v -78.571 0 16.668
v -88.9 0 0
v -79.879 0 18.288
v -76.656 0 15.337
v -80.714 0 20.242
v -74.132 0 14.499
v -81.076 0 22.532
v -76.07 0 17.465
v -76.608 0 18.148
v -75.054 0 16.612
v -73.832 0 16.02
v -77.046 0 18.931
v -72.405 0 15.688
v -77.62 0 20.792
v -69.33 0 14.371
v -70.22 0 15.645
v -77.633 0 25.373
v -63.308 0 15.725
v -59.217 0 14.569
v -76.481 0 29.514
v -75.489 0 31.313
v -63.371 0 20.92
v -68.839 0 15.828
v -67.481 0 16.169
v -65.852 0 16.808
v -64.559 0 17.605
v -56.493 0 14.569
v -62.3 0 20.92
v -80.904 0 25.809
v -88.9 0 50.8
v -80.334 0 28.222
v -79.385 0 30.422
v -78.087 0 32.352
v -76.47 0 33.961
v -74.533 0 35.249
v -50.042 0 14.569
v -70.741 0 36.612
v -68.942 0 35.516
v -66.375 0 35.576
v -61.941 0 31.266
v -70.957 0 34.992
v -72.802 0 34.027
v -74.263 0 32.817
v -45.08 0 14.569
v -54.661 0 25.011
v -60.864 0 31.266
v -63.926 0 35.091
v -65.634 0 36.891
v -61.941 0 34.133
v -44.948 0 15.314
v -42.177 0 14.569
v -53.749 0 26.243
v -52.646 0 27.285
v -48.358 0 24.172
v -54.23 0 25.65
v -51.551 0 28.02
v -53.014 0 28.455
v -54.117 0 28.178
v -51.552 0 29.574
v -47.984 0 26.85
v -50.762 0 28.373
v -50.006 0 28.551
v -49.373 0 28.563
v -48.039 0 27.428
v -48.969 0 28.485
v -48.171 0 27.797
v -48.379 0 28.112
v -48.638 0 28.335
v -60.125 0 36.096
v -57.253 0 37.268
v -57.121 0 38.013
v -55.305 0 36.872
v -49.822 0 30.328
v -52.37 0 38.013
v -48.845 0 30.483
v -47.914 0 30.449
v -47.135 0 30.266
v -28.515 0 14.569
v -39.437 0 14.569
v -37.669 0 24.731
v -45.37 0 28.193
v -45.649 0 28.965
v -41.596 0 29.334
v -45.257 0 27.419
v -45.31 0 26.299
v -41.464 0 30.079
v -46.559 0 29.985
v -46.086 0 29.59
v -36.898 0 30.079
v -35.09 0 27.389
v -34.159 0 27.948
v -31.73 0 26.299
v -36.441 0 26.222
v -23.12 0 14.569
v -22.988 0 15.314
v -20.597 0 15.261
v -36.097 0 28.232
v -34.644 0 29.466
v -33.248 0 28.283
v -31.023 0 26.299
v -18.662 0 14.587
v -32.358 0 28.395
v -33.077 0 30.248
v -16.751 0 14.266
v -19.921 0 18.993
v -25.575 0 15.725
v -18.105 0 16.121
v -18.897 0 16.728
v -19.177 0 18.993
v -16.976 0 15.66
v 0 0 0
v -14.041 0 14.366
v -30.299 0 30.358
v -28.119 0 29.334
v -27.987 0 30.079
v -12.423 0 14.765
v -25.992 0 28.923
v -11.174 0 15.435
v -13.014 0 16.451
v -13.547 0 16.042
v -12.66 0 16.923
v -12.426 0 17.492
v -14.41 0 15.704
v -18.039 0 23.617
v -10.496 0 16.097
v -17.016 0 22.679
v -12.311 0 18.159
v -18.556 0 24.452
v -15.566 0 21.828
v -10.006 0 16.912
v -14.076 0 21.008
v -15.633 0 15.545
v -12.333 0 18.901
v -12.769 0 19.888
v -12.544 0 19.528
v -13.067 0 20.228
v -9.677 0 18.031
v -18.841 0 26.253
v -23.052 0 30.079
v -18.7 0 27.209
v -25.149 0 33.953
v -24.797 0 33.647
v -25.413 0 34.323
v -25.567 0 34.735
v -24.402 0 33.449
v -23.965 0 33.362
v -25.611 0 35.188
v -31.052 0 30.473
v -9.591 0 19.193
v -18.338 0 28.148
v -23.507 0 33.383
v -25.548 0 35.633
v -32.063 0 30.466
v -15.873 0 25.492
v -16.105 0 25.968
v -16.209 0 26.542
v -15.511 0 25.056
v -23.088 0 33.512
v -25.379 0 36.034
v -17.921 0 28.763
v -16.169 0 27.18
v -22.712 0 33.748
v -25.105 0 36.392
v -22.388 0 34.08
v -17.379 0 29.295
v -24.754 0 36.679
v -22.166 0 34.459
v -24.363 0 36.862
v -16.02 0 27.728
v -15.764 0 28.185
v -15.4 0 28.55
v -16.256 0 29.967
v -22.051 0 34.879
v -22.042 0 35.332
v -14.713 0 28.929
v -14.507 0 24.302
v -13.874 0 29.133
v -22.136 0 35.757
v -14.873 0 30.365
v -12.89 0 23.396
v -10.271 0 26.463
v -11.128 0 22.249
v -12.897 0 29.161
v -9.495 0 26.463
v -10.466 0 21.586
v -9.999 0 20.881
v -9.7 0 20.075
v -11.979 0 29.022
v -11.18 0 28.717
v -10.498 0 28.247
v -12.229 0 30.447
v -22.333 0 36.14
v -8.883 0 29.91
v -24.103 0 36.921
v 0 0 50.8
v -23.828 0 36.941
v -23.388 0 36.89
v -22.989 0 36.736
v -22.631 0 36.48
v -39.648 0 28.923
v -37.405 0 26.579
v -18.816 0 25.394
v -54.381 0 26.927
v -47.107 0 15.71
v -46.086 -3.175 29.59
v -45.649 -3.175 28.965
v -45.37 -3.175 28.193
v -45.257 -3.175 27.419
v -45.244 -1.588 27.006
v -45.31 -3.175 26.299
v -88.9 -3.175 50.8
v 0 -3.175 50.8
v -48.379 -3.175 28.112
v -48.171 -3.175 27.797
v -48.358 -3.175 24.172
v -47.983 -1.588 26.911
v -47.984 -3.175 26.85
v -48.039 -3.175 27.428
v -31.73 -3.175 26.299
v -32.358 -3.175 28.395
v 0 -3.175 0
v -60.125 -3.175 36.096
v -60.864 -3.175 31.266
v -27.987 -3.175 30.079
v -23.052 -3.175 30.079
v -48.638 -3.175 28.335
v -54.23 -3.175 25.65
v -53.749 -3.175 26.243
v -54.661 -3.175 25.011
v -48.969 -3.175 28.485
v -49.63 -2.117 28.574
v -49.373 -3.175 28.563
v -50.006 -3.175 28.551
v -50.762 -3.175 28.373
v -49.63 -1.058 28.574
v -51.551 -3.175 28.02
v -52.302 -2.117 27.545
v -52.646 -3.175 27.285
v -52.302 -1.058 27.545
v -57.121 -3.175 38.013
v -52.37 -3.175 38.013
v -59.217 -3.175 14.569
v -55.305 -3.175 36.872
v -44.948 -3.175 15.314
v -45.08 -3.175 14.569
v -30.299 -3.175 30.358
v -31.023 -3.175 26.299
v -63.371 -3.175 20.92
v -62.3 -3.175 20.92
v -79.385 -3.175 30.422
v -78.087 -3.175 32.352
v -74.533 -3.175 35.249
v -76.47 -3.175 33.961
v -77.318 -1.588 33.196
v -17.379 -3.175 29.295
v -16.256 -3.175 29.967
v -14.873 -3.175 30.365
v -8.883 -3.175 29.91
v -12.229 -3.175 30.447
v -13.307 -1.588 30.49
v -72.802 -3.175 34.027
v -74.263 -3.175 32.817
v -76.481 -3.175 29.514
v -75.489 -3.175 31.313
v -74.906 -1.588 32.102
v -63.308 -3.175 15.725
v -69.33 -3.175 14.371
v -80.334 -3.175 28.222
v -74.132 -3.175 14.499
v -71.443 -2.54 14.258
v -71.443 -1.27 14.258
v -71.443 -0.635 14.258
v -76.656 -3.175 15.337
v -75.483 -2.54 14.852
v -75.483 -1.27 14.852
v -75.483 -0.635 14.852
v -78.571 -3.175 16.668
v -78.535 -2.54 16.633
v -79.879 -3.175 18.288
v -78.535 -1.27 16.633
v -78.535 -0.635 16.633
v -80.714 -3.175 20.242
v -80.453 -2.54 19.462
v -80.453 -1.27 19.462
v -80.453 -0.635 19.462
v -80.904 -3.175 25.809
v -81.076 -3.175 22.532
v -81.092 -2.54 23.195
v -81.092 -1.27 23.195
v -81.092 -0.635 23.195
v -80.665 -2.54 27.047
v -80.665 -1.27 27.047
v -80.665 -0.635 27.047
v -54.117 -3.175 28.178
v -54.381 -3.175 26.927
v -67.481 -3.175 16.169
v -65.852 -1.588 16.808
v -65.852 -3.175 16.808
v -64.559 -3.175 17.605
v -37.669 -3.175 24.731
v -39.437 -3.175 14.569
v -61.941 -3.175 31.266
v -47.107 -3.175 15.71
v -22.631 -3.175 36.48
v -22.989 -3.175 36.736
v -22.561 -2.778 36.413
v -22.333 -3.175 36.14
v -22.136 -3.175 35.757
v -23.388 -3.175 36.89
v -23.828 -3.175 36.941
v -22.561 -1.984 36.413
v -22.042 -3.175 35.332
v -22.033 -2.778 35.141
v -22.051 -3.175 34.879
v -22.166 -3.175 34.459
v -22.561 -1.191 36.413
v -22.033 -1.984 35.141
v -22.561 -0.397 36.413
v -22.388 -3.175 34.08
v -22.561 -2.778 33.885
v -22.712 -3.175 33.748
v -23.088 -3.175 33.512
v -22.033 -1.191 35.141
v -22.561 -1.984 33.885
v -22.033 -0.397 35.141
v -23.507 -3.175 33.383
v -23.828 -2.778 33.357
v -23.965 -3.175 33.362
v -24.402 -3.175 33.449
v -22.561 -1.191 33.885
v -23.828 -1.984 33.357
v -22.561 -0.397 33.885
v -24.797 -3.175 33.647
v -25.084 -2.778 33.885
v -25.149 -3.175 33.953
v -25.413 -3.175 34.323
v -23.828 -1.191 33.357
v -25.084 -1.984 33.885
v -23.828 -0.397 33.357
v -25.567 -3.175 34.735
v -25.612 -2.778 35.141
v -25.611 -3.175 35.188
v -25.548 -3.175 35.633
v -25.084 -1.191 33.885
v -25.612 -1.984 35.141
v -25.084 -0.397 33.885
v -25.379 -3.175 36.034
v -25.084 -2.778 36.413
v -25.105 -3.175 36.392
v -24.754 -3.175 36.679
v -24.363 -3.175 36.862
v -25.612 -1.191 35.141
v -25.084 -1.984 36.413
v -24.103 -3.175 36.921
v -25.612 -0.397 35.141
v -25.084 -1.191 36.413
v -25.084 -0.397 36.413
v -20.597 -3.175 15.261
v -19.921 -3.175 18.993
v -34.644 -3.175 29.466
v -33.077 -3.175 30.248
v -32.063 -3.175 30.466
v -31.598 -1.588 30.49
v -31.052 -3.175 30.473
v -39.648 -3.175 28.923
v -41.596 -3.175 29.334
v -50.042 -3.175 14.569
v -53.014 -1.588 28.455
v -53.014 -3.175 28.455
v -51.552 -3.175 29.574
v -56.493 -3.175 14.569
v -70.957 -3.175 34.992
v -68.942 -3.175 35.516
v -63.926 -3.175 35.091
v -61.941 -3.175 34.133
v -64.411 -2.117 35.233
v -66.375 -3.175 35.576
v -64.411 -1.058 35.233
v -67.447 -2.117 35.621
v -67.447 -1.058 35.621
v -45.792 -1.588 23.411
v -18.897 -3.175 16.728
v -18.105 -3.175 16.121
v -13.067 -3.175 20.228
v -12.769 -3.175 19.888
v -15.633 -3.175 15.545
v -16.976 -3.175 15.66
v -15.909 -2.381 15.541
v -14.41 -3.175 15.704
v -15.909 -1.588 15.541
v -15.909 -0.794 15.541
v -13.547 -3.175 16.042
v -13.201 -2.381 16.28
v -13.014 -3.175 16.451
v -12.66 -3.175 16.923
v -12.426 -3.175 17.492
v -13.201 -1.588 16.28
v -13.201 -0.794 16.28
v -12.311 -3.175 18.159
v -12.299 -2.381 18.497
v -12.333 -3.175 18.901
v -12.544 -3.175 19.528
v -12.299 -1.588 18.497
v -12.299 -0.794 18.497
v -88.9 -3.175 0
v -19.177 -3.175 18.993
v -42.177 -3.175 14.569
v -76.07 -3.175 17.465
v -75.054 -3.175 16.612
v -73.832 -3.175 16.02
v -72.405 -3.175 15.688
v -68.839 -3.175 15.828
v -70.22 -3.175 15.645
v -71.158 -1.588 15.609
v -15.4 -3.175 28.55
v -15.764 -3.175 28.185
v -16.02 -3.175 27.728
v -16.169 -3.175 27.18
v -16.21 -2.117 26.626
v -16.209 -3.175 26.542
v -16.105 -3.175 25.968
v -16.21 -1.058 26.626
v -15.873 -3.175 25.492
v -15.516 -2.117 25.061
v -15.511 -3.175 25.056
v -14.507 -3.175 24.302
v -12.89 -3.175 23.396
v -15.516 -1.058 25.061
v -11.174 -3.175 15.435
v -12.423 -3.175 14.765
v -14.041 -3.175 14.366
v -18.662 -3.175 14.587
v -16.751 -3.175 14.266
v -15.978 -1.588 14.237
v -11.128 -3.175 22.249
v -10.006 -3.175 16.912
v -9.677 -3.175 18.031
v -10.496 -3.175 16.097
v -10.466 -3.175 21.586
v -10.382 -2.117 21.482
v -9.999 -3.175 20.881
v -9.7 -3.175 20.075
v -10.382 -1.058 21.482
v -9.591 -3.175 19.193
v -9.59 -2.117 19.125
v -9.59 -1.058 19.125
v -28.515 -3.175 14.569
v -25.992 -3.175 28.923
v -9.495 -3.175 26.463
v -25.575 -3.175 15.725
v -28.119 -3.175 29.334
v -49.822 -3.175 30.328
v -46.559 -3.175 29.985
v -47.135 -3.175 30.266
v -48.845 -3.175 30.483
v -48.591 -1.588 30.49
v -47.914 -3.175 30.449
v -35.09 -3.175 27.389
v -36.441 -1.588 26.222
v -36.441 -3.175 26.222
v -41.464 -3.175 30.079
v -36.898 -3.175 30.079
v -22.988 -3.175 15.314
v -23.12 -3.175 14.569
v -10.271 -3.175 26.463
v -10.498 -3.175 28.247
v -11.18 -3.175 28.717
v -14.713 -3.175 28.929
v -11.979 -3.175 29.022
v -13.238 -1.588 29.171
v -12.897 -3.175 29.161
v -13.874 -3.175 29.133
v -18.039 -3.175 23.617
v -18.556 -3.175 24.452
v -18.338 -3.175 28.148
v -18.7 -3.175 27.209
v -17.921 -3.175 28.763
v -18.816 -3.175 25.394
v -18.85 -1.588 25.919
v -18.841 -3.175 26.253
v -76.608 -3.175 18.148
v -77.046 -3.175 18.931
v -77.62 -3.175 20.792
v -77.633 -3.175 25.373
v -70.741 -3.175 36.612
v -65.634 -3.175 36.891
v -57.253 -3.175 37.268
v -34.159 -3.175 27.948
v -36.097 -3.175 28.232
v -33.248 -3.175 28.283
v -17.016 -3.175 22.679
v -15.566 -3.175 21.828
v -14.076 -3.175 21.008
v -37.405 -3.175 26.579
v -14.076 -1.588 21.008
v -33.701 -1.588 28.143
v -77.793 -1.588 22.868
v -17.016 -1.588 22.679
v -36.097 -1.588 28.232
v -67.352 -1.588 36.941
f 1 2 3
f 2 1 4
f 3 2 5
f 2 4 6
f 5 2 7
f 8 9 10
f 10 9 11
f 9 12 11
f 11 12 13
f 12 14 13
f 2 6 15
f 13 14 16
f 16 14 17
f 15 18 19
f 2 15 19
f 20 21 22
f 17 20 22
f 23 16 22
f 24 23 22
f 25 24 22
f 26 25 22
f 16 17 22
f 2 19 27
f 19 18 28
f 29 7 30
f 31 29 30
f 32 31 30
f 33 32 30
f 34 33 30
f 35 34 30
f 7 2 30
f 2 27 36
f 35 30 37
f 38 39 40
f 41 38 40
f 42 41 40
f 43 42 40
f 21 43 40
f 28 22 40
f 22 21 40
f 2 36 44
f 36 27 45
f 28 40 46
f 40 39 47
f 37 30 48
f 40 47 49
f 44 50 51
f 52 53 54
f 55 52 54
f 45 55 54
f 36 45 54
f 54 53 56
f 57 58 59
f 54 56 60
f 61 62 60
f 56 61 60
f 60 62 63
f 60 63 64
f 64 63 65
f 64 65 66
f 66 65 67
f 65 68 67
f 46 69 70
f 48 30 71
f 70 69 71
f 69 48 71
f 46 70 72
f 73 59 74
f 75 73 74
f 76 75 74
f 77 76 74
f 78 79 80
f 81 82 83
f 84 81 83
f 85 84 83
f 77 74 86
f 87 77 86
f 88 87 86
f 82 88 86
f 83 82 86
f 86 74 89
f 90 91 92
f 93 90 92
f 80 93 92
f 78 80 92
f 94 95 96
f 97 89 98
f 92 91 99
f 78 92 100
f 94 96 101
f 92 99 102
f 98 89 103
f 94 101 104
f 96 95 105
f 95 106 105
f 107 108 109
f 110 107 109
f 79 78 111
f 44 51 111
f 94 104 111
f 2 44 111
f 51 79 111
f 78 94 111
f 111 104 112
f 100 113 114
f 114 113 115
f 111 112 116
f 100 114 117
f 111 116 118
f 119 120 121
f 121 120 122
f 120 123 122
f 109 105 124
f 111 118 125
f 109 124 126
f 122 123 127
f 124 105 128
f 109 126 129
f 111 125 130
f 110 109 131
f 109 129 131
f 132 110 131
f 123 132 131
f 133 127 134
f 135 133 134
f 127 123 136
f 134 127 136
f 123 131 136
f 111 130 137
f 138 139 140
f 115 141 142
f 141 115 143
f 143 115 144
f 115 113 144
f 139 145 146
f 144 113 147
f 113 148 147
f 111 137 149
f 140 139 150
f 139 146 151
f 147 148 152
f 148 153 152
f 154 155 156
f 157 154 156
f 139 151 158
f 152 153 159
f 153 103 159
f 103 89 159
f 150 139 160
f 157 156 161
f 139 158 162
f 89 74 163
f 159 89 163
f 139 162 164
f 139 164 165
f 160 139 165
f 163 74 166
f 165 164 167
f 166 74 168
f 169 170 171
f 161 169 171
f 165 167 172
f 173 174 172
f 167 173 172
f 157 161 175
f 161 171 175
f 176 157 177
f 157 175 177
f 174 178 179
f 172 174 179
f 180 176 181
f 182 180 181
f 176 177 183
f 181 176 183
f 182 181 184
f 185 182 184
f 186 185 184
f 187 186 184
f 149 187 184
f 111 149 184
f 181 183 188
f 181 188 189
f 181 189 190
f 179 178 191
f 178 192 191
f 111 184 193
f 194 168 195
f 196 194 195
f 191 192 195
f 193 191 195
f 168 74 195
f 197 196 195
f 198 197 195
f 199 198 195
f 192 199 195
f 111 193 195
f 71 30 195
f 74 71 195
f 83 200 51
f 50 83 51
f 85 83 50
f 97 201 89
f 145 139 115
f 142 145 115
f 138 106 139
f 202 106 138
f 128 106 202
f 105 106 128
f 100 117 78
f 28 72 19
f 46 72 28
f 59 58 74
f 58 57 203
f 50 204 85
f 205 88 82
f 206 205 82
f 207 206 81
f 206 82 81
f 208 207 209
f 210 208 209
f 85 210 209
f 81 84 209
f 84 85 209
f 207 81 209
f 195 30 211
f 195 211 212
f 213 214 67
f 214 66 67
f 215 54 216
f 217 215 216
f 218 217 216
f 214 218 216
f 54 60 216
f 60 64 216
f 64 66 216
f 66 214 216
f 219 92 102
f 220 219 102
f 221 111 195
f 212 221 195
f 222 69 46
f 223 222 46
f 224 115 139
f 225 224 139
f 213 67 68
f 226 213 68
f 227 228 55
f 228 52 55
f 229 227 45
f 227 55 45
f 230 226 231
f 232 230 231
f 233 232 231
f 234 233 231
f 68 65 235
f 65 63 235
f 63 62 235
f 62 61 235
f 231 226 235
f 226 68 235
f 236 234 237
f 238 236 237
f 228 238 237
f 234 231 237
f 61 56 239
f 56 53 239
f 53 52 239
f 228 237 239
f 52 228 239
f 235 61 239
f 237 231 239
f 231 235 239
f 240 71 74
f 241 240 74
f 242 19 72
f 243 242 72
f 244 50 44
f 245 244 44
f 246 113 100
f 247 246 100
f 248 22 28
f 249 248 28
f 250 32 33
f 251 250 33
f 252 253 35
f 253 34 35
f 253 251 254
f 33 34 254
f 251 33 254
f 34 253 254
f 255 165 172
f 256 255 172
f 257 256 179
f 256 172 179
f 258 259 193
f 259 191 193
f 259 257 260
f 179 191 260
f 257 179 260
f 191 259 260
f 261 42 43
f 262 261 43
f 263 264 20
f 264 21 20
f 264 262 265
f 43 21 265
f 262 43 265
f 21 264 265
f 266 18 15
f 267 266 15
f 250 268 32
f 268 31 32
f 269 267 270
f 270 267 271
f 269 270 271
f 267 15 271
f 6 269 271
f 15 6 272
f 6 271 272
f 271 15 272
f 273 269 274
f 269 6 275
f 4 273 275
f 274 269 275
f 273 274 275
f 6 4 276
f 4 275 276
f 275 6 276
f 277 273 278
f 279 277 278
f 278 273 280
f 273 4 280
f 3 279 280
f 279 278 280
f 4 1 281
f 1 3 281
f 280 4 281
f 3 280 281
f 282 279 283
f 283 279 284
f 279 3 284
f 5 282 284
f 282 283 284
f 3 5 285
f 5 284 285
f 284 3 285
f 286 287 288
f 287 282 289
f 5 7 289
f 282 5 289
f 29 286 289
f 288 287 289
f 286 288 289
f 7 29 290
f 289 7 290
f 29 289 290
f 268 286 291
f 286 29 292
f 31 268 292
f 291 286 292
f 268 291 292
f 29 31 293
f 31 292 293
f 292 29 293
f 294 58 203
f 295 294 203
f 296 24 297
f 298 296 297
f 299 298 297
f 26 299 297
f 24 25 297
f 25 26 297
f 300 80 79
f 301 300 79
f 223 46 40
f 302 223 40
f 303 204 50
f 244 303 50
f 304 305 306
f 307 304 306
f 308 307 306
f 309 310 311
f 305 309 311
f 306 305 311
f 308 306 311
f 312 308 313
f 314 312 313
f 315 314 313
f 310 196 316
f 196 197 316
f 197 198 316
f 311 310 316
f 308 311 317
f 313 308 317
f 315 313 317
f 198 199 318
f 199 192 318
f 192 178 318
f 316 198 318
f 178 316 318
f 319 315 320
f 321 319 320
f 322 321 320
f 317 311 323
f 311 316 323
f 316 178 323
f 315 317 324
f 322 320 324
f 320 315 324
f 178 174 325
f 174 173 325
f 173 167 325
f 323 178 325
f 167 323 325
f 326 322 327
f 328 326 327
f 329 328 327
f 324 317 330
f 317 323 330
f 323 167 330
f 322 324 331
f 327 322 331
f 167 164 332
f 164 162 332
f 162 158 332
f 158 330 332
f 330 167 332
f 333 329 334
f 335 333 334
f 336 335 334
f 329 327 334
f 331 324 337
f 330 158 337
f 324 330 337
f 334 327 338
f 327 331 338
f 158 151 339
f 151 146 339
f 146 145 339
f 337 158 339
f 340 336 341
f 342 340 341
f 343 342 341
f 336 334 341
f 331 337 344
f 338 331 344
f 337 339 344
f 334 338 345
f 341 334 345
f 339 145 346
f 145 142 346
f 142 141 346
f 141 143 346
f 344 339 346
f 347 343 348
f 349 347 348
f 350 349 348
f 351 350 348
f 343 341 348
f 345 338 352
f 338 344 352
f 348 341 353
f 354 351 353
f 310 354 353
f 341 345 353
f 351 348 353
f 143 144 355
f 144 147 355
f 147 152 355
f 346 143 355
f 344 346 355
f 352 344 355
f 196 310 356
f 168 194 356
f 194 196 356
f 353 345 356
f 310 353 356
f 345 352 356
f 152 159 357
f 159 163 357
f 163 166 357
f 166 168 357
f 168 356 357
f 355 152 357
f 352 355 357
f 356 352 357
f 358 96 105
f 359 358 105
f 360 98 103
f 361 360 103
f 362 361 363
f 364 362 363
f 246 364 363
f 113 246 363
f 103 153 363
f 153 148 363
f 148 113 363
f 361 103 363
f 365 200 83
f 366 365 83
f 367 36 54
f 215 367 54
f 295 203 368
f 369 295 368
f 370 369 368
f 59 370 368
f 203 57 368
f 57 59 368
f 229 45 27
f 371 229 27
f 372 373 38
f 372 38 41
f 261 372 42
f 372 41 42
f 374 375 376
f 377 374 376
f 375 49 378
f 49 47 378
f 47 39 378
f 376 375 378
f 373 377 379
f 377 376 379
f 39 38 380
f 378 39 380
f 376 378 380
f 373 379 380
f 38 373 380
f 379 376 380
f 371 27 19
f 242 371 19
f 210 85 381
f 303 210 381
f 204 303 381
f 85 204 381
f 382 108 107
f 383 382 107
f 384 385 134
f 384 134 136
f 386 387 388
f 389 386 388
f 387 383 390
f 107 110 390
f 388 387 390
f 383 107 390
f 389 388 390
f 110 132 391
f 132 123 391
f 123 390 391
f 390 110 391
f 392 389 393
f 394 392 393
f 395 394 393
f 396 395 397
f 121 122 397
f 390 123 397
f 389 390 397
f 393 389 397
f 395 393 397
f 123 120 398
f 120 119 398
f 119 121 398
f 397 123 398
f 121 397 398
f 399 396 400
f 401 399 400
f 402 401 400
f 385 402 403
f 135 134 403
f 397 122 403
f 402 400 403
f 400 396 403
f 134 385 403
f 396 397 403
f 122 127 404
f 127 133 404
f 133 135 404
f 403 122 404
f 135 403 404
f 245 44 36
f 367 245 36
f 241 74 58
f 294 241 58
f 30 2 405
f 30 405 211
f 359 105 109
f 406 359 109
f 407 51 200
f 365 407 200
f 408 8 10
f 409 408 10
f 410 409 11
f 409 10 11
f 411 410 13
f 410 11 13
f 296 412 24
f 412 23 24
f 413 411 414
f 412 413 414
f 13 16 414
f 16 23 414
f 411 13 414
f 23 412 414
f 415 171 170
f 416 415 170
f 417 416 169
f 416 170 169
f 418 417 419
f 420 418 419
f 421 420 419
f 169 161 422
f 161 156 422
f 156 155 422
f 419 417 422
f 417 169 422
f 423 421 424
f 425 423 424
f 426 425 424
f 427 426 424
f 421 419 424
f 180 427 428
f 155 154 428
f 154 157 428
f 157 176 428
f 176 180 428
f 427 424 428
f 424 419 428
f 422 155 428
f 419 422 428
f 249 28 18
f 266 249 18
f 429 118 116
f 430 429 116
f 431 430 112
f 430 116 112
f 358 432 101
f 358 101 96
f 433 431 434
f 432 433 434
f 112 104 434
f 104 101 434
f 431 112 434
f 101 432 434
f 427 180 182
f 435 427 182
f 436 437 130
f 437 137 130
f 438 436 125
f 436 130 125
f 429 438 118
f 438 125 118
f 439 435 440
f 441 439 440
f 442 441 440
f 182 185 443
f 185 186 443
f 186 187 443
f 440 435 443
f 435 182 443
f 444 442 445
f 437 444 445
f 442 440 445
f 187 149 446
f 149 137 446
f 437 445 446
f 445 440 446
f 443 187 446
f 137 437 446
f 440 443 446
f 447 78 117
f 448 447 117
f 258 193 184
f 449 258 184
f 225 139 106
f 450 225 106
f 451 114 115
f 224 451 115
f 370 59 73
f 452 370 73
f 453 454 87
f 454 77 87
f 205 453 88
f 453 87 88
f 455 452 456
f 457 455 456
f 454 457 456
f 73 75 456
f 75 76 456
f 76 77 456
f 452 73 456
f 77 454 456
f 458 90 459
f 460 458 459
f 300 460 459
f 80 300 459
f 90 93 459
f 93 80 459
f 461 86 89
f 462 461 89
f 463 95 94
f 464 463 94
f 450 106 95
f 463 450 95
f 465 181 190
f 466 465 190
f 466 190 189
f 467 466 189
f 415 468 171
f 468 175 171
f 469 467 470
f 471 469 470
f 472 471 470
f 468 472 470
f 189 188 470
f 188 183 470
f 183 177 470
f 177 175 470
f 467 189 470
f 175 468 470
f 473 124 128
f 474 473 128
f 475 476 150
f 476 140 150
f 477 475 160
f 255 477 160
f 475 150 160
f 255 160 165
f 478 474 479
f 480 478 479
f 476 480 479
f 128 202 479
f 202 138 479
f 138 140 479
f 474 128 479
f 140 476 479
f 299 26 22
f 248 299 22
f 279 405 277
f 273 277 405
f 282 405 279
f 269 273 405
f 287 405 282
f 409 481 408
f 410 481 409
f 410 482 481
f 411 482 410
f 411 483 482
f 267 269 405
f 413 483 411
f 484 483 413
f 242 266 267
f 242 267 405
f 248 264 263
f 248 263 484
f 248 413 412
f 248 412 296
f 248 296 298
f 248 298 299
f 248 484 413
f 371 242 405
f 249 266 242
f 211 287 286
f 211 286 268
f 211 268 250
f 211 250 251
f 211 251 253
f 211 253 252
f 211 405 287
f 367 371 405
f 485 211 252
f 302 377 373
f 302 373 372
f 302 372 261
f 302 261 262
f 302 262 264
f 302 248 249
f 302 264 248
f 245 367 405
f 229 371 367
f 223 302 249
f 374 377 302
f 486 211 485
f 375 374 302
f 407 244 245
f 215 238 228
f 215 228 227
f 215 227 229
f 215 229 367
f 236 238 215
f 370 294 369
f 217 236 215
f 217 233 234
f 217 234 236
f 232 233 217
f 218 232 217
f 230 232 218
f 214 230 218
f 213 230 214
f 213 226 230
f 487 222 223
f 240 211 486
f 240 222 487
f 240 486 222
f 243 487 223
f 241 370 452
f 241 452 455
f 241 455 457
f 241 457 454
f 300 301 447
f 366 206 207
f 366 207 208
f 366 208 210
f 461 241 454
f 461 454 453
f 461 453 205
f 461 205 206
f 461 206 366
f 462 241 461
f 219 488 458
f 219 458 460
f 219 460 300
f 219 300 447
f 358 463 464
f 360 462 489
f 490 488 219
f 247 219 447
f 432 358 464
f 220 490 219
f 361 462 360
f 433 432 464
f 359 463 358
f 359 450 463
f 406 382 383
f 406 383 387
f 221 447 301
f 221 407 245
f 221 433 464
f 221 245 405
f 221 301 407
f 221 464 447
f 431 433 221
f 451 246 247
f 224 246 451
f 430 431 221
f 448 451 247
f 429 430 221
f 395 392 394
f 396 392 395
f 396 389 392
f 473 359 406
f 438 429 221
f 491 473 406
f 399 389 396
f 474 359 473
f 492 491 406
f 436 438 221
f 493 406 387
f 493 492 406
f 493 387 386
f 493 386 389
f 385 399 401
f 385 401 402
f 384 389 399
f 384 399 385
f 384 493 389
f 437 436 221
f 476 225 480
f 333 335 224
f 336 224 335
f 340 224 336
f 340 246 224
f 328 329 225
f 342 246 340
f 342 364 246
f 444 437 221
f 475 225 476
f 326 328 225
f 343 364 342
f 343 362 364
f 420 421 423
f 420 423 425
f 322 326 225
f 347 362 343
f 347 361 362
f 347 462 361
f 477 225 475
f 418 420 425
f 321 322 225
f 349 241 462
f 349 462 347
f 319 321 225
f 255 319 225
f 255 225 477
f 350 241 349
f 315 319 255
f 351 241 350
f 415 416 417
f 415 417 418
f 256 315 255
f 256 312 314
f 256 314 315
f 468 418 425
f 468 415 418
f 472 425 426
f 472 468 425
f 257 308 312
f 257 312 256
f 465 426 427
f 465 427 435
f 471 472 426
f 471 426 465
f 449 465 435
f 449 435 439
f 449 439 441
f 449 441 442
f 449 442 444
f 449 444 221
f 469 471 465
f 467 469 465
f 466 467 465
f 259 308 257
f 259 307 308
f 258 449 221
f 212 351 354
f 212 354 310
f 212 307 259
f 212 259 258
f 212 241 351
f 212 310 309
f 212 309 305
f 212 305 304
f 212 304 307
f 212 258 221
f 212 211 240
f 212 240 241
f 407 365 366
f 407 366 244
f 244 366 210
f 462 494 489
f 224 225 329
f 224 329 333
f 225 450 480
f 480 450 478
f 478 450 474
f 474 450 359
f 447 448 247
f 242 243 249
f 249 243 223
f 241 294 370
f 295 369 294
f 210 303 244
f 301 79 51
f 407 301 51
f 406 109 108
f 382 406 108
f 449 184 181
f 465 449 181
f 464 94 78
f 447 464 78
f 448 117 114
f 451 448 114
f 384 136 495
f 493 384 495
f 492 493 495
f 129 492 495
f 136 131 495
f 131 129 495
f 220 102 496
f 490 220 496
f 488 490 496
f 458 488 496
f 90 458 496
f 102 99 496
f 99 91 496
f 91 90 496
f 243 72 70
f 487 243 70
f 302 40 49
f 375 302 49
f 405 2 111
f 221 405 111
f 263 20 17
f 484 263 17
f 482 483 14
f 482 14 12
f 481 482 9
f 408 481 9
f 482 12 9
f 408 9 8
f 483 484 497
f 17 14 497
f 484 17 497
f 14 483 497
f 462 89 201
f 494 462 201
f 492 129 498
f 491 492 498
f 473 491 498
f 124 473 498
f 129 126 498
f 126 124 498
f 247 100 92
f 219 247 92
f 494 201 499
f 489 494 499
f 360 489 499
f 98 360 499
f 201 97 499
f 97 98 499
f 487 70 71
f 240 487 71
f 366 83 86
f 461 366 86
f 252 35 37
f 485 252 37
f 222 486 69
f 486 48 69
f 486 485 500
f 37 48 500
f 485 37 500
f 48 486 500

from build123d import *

# Parameters (mm, degrees)
F0_W     = 88.9
F0_H     = 50.8
F1_DEPTH = 3.175


with BuildPart() as f1:
    # F0 (on Front) → F1 (new body)
    with BuildSketch(Plane.XZ):
        with Locations((-44.45, 25.4)):
            Rectangle(F0_W, F0_H)
        with BuildLine():
            add(Edge.make_bspline(
                [(-34.643851095, 29.4662719552), (-33.1182674441, 30.4903661706), (-31.5979626294, 30.4903661706)],
                knots=[0, 0, 0, 1, 1, 1], degree=2))
            add(Edge.make_bspline(
                [(-31.5979626294, 30.4903661706), (-30.7744641881, 30.4903661706), (-30.2993689335, 30.3583952666)],
                knots=[0, 0, 0, 1, 1, 1], degree=2))
            Line((-30.2993689335, 30.3583952666), (-31.0225694878, 26.2989702579))
            Line((-31.0225694878, 26.2989702579), (-31.7299335335, 26.2989702579))
            Line((-31.7299335335, 26.2989702579), (-32.3581150368, 28.3946682143))
            add(Edge.make_bspline(
                [(-32.3581150368, 28.3946682143), (-33.6778240773, 28.3946682143), (-35.0899127507, 27.3890499254)],
                knots=[0, 0, 0, 1, 1, 1], degree=2))
            add(Edge.make_bspline(
                [(-35.0899127507, 27.3890499254), (-36.502001424, 26.3834316365), (-37.6686242158, 24.7311559178)],
                knots=[0, 0, 0, 1, 1, 1], degree=2))
            Line((-37.6686242158, 24.7311559178), (-39.4370343302, 14.5693963057))
            Line((-39.4370343302, 14.5693963057), (-42.1767502983, 14.5693963057))
            Line((-42.1767502983, 14.5693963057), (-39.6481877766, 28.9225518305))
            Line((-39.6481877766, 28.9225518305), (-41.5960783205, 29.3343010511))
            Line((-41.5960783205, 29.3343010511), (-41.4641074164, 30.07861695))
            Line((-41.4641074164, 30.07861695), (-36.8979141362, 30.07861695))
            Line((-36.8979141362, 30.07861695), (-37.4046824077, 26.5787485745))
            add(Edge.make_bspline(
                [(-37.4046824077, 26.5787485745), (-36.1694347458, 28.4421777397), (-34.643851095, 29.4662719552)],
                knots=[0, 0, 0, 1, 1, 1], degree=2))
        make_face(mode=Mode.SUBTRACT)
        Polygon((-23.051526883, 30.07861695), (-25.5748105685, 15.7254614252), (-22.988180849, 15.3137122046), (-23.1201517531, 14.5693963057), (-28.5151223108, 14.5693963057), (-25.9918386253, 28.9225518305), (-28.1192095986, 29.3343010511), (-27.9872386945, 30.07861695), align=None, mode=Mode.SUBTRACT)
        with BuildLine():
            add(Edge.make_bspline(
                [(-10.3823200939, 21.48203226), (-9.5904946696, 20.4605774626), (-9.5904946696, 19.1250319136)],
                knots=[0, 0, 0, 1, 1, 1], degree=2))
            add(Edge.make_bspline(
                [(-9.5904946696, 19.1250319136), (-9.5904946696, 16.6334212451), (-11.1741455182, 15.4351254363)],
                knots=[0, 0, 0, 1, 1, 1], degree=2))
            add(Edge.make_bspline(
                [(-11.1741455182, 15.4351254363), (-12.7577963669, 14.2368296275), (-15.9778864258, 14.2368296275)],
                knots=[0, 0, 0, 1, 1, 1], degree=2))
            add(Edge.make_bspline(
                [(-15.9778864258, 14.2368296275), (-18.2530648116, 14.2368296275), (-20.5968680676, 15.260923843)],
                knots=[0, 0, 0, 1, 1, 1], degree=2))
            Line((-20.5968680676, 15.260923843), (-19.9211770388, 18.9930610096))
            Line((-19.9211770388, 18.9930610096), (-19.17686114, 18.9930610096))
            Line((-19.17686114, 18.9930610096), (-18.8970828234, 16.728440296))
            add(Edge.make_bspline(
                [(-18.8970828234, 16.728440296), (-18.4694970943, 16.2691815499), (-17.6855899242, 15.9049418547)],
                knots=[0, 0, 0, 1, 1, 1], degree=2))
            add(Edge.make_bspline(
                [(-17.6855899242, 15.9049418547), (-16.9016827541, 15.5407021595), (-15.9092615556, 15.5407021595)],
                knots=[0, 0, 0, 1, 1, 1], degree=2))
            add(Edge.make_bspline(
                [(-15.9092615556, 15.5407021595), (-12.2985376208, 15.5407021595), (-12.2985376208, 18.4968504103)],
                knots=[0, 0, 0, 1, 1, 1], degree=2))
            add(Edge.make_bspline(
                [(-12.2985376208, 18.4968504103), (-12.2985376208, 19.4681562642), (-13.0666082824, 20.2283086715)],
                knots=[0, 0, 0, 1, 1, 1], degree=2))
            add(Edge.make_bspline(
                [(-13.0666082824, 20.2283086715), (-13.8346789439, 20.9884610788), (-15.5661372051, 21.8277960286)],
                knots=[0, 0, 0, 1, 1, 1], degree=2))
            add(Edge.make_bspline(
                [(-15.5661372051, 21.8277960286), (-17.2289705962, 22.6354579614), (-18.0392719471, 23.6173214876)],
                knots=[0, 0, 0, 1, 1, 1], degree=2))
            add(Edge.make_bspline(
                [(-18.0392719471, 23.6173214876), (-18.8495732979, 24.5991850137), (-18.8495732979, 25.9188940542)],
                knots=[0, 0, 0, 1, 1, 1], degree=2))
            add(Edge.make_bspline(
                [(-18.8495732979, 25.9188940542), (-18.8495732979, 28.0990533892), (-17.3794174268, 29.2947097799)],
                knots=[0, 0, 0, 1, 1, 1], degree=2))
            add(Edge.make_bspline(
                [(-17.3794174268, 29.2947097799), (-15.9092615556, 30.4903661706), (-13.3067953277, 30.4903661706)],
                knots=[0, 0, 0, 1, 1, 1], degree=2))
            add(Edge.make_bspline(
                [(-13.3067953277, 30.4903661706), (-11.4380873263, 30.4903661706), (-8.8831306239, 29.9096941928)],
                knots=[0, 0, 0, 1, 1, 1], degree=2))
            Line((-8.8831306239, 29.9096941928), (-9.4954756187, 26.4626141789))
            Line((-9.4954756187, 26.4626141789), (-10.2714645345, 26.4626141789))
            Line((-10.2714645345, 26.4626141789), (-10.4984544895, 28.2468608017))
            add(Edge.make_bspline(
                [(-10.4984544895, 28.2468608017), (-11.5383852134, 29.1706571301), (-13.2381704576, 29.1706571301)],
                knots=[0, 0, 0, 1, 1, 1], degree=2))
            add(Edge.make_bspline(
                [(-13.2381704576, 29.1706571301), (-14.5895525151, 29.1706571301), (-15.399853866, 28.5503938811)],
                knots=[0, 0, 0, 1, 1, 1], degree=2))
            add(Edge.make_bspline(
                [(-15.399853866, 28.5503938811), (-16.2101552169, 27.930130632), (-16.2101552169, 26.6262581)],
                knots=[0, 0, 0, 1, 1, 1], degree=2))
            add(Edge.make_bspline(
                [(-16.2101552169, 26.6262581), (-16.2101552169, 25.7394136247), (-15.5159882616, 25.0610831779)],
                knots=[0, 0, 0, 1, 1, 1], degree=2))
            add(Edge.make_bspline(
                [(-15.5159882616, 25.0610831779), (-14.8218213063, 24.3827527311), (-12.8897672709, 23.3956103688)],
                knots=[0, 0, 0, 1, 1, 1], degree=2))
            add(Edge.make_bspline(
                [(-12.8897672709, 23.3956103688), (-11.1741455182, 22.5034870574), (-10.3823200939, 21.48203226)],
                knots=[0, 0, 0, 1, 1, 1], degree=2))
        make_face(mode=Mode.SUBTRACT)
        with BuildLine():
            add(Edge.make_bspline(
                [(-67.3884718085, 14.6459394301), (-69.5739099796, 14.2579449722), (-71.442617981, 14.2579449722)],
                knots=[0, 0, 0, 1, 1, 1], degree=2))
            add(Edge.make_bspline(
                [(-71.442617981, 14.2579449722), (-75.9771382443, 14.2579449722), (-78.5347343648, 16.6334212451)],
                knots=[0, 0, 0, 1, 1, 1], degree=2))
            add(Edge.make_bspline(
                [(-78.5347343648, 16.6334212451), (-81.0923304853, 19.008897518), (-81.0923304853, 23.1950145946)],
                knots=[0, 0, 0, 1, 1, 1], degree=2))
            add(Edge.make_bspline(
                [(-81.0923304853, 23.1950145946), (-81.0923304853, 27.2861126202), (-79.3846269869, 30.4217413005)],
                knots=[0, 0, 0, 1, 1, 1], degree=2))
            add(Edge.make_bspline(
                [(-79.3846269869, 30.4217413005), (-77.6769234884, 33.5573699808), (-74.5333765539, 35.2492369708)],
                knots=[0, 0, 0, 1, 1, 1], degree=2))
            add(Edge.make_bspline(
                [(-74.5333765539, 35.2492369708), (-71.3898296194, 36.9411039607), (-67.3515199554, 36.9411039607)],
                knots=[0, 0, 0, 1, 1, 1], degree=2))
            add(Edge.make_bspline(
                [(-67.3515199554, 36.9411039607), (-63.8674880884, 36.9411039607), (-60.1247932494, 36.0964901748)],
                knots=[0, 0, 0, 1, 1, 1], degree=2))
            Line((-60.1247932494, 36.0964901748), (-60.8638303121, 31.2663550865))
            Line((-60.8638303121, 31.2663550865), (-61.9407128892, 31.2663550865))
            Line((-61.9407128892, 31.2663550865), (-61.9407128892, 34.1327631225))
            add(Edge.make_bspline(
                [(-61.9407128892, 34.1327631225), (-62.9595282685, 34.8454060044), (-64.4112082131, 35.2334004623)],
                knots=[0, 0, 0, 1, 1, 1], degree=2))
            add(Edge.make_bspline(
                [(-64.4112082131, 35.2334004623), (-65.8628881577, 35.6213949202), (-67.4465390063, 35.6213949202)],
                knots=[0, 0, 0, 1, 1, 1], degree=2))
            add(Edge.make_bspline(
                [(-67.4465390063, 35.6213949202), (-70.434360274, 35.6213949202), (-72.8019182927, 34.0271863992)],
                knots=[0, 0, 0, 1, 1, 1], degree=2))
            add(Edge.make_bspline(
                [(-72.8019182927, 34.0271863992), (-75.1694763114, 32.4329778783), (-76.4812670977, 29.5137814806)],
                knots=[0, 0, 0, 1, 1, 1], degree=2))
            add(Edge.make_bspline(
                [(-76.4812670977, 29.5137814806), (-77.793057884, 26.594585083), (-77.793057884, 22.8677267525)],
                knots=[0, 0, 0, 1, 1, 1], degree=2))
            add(Edge.make_bspline(
                [(-77.793057884, 22.8677267525), (-77.793057884, 19.3203488516), (-76.0695178771, 17.4648379406)],
                knots=[0, 0, 0, 1, 1, 1], degree=2))
            add(Edge.make_bspline(
                [(-76.0695178771, 17.4648379406), (-74.3459778702, 15.6093270297), (-71.1575608282, 15.6093270297)],
                knots=[0, 0, 0, 1, 1, 1], degree=2))
            add(Edge.make_bspline(
                [(-71.1575608282, 15.6093270297), (-69.2782951545, 15.6093270297), (-67.4808514413, 16.1688836628)],
                knots=[0, 0, 0, 1, 1, 1], degree=2))
            add(Edge.make_bspline(
                [(-67.4808514413, 16.1688836628), (-65.6834077281, 16.728440296), (-64.5590156256, 17.6047270989)],
                knots=[0, 0, 0, 1, 1, 1], degree=2))
            Line((-64.5590156256, 17.6047270989), (-63.3712774891, 20.9198362087))
            Line((-63.3712774891, 20.9198362087), (-62.2996737482, 20.9198362087))
            Line((-62.2996737482, 20.9198362087), (-63.3079314552, 15.7254614252))
            add(Edge.make_bspline(
                [(-63.3079314552, 15.7254614252), (-65.2030336374, 15.033933888), (-67.3884718085, 14.6459394301)],
                knots=[0, 0, 0, 1, 1, 1], degree=2))
        make_face(mode=Mode.SUBTRACT)
        with BuildLine():
            Line((-59.2168334296, 14.5693963057), (-55.3052158334, 36.8724790906))
            Line((-55.3052158334, 36.8724790906), (-57.2531063773, 37.2683918028))
            Line((-57.2531063773, 37.2683918028), (-57.1211354732, 38.0127077016))
            Line((-57.1211354732, 38.0127077016), (-52.3701829273, 38.0127077016))
            Line((-52.3701829273, 38.0127077016), (-54.117477697, 28.1782359316))
            Line((-54.117477697, 28.1782359316), (-54.3814195051, 26.9271517612))
            add(Edge.make_bspline(
                [(-54.3814195051, 26.9271517612), (-53.0617104645, 28.6586100224), (-51.5519633222, 29.5744880965)],
                knots=[0, 0, 0, 1, 1, 1], degree=2))
            add(Edge.make_bspline(
                [(-51.5519633222, 29.5744880965), (-50.0422161798, 30.4903661706), (-48.5905362352, 30.4903661706)],
                knots=[0, 0, 0, 1, 1, 1], degree=2))
            add(Edge.make_bspline(
                [(-48.5905362352, 30.4903661706), (-46.9277028442, 30.4903661706), (-46.0857284763, 29.590324605)],
                knots=[0, 0, 0, 1, 1, 1], degree=2))
            add(Edge.make_bspline(
                [(-46.0857284763, 29.590324605), (-45.2437541085, 28.6902830394), (-45.2437541085, 27.0063343036)],
                knots=[0, 0, 0, 1, 1, 1], degree=2))
            add(Edge.make_bspline(
                [(-45.2437541085, 27.0063343036), (-45.2437541085, 26.7793443487), (-45.3097395605, 26.2989702579)],
                knots=[0, 0, 0, 1, 1, 1], degree=2))
            add(Edge.make_bspline(
                [(-45.3097395605, 26.2989702579), (-45.3757250125, 25.8185961672), (-47.1071832737, 15.7096249167)],
                knots=[0, 0, 0, 1, 1, 1], degree=2))
            Line((-47.1071832737, 15.7096249167), (-44.9481392834, 15.3137122046))
            Line((-44.9481392834, 15.3137122046), (-45.0801101874, 14.5693963057))
            Line((-45.0801101874, 14.5693963057), (-50.0422161798, 14.5693963057))
            Line((-50.0422161798, 14.5693963057), (-48.3582674441, 24.1715992846))
            add(Edge.make_bspline(
                [(-48.3582674441, 24.1715992846), (-47.9834700766, 26.2672972409), (-47.9834700766, 26.9113152527)],
                knots=[0, 0, 0, 1, 1, 1], degree=2))
            add(Edge.make_bspline(
                [(-47.9834700766, 26.9113152527), (-47.9834700766, 27.6503523154), (-48.3793827888, 28.1122504796)],
                knots=[0, 0, 0, 1, 1, 1], degree=2))
            add(Edge.make_bspline(
                [(-48.3793827888, 28.1122504796), (-48.7752955009, 28.5741486438), (-49.6304669592, 28.5741486438)],
                knots=[0, 0, 0, 1, 1, 1], degree=2))
            add(Edge.make_bspline(
                [(-49.6304669592, 28.5741486438), (-50.8657146211, 28.5741486438), (-52.3015580572, 27.5447755922)],
                knots=[0, 0, 0, 1, 1, 1], degree=2))
            add(Edge.make_bspline(
                [(-52.3015580572, 27.5447755922), (-53.7374014933, 26.5154025406), (-54.6611978217, 25.0109342344)],
                knots=[0, 0, 0, 1, 1, 1], degree=2))
            Line((-54.6611978217, 25.0109342344), (-56.4929539699, 14.5693963057))
            Line((-56.4929539699, 14.5693963057), (-59.2168334296, 14.5693963057))
        make_face(mode=Mode.SUBTRACT)
        with BuildLine():
            add(Edge.make_bspline(
                [(-22.5605951199, 36.4132203445), (-22.0327115037, 35.8853367283), (-22.0327115037, 35.1410208294)],
                knots=[0, 0, 0, 1, 1, 1], degree=2))
            add(Edge.make_bspline(
                [(-22.0327115037, 35.1410208294), (-22.0327115037, 34.4125414391), (-22.5605951199, 33.8846578229)],
                knots=[0, 0, 0, 1, 1, 1], degree=2))
            add(Edge.make_bspline(
                [(-22.5605951199, 33.8846578229), (-23.0884787361, 33.3567742067), (-23.8275157988, 33.3567742067)],
                knots=[0, 0, 0, 1, 1, 1], degree=2))
            add(Edge.make_bspline(
                [(-23.8275157988, 33.3567742067), (-24.5559951892, 33.3567742067), (-25.0838788054, 33.8846578229)],
                knots=[0, 0, 0, 1, 1, 1], degree=2))
            add(Edge.make_bspline(
                [(-25.0838788054, 33.8846578229), (-25.6117624216, 34.4125414391), (-25.6117624216, 35.1410208294)],
                knots=[0, 0, 0, 1, 1, 1], degree=2))
            add(Edge.make_bspline(
                [(-25.6117624216, 35.1410208294), (-25.6117624216, 35.8853367283), (-25.0838788054, 36.4132203445)],
                knots=[0, 0, 0, 1, 1, 1], degree=2))
            add(Edge.make_bspline(
                [(-25.0838788054, 36.4132203445), (-24.5559951892, 36.9411039607), (-23.8275157988, 36.9411039607)],
                knots=[0, 0, 0, 1, 1, 1], degree=2))
            add(Edge.make_bspline(
                [(-23.8275157988, 36.9411039607), (-23.0884787361, 36.9411039607), (-22.5605951199, 36.4132203445)],
                knots=[0, 0, 0, 1, 1, 1], degree=2))
        make_face(mode=Mode.SUBTRACT)
    extrude(amount=F1_DEPTH)


solid = f1.part
